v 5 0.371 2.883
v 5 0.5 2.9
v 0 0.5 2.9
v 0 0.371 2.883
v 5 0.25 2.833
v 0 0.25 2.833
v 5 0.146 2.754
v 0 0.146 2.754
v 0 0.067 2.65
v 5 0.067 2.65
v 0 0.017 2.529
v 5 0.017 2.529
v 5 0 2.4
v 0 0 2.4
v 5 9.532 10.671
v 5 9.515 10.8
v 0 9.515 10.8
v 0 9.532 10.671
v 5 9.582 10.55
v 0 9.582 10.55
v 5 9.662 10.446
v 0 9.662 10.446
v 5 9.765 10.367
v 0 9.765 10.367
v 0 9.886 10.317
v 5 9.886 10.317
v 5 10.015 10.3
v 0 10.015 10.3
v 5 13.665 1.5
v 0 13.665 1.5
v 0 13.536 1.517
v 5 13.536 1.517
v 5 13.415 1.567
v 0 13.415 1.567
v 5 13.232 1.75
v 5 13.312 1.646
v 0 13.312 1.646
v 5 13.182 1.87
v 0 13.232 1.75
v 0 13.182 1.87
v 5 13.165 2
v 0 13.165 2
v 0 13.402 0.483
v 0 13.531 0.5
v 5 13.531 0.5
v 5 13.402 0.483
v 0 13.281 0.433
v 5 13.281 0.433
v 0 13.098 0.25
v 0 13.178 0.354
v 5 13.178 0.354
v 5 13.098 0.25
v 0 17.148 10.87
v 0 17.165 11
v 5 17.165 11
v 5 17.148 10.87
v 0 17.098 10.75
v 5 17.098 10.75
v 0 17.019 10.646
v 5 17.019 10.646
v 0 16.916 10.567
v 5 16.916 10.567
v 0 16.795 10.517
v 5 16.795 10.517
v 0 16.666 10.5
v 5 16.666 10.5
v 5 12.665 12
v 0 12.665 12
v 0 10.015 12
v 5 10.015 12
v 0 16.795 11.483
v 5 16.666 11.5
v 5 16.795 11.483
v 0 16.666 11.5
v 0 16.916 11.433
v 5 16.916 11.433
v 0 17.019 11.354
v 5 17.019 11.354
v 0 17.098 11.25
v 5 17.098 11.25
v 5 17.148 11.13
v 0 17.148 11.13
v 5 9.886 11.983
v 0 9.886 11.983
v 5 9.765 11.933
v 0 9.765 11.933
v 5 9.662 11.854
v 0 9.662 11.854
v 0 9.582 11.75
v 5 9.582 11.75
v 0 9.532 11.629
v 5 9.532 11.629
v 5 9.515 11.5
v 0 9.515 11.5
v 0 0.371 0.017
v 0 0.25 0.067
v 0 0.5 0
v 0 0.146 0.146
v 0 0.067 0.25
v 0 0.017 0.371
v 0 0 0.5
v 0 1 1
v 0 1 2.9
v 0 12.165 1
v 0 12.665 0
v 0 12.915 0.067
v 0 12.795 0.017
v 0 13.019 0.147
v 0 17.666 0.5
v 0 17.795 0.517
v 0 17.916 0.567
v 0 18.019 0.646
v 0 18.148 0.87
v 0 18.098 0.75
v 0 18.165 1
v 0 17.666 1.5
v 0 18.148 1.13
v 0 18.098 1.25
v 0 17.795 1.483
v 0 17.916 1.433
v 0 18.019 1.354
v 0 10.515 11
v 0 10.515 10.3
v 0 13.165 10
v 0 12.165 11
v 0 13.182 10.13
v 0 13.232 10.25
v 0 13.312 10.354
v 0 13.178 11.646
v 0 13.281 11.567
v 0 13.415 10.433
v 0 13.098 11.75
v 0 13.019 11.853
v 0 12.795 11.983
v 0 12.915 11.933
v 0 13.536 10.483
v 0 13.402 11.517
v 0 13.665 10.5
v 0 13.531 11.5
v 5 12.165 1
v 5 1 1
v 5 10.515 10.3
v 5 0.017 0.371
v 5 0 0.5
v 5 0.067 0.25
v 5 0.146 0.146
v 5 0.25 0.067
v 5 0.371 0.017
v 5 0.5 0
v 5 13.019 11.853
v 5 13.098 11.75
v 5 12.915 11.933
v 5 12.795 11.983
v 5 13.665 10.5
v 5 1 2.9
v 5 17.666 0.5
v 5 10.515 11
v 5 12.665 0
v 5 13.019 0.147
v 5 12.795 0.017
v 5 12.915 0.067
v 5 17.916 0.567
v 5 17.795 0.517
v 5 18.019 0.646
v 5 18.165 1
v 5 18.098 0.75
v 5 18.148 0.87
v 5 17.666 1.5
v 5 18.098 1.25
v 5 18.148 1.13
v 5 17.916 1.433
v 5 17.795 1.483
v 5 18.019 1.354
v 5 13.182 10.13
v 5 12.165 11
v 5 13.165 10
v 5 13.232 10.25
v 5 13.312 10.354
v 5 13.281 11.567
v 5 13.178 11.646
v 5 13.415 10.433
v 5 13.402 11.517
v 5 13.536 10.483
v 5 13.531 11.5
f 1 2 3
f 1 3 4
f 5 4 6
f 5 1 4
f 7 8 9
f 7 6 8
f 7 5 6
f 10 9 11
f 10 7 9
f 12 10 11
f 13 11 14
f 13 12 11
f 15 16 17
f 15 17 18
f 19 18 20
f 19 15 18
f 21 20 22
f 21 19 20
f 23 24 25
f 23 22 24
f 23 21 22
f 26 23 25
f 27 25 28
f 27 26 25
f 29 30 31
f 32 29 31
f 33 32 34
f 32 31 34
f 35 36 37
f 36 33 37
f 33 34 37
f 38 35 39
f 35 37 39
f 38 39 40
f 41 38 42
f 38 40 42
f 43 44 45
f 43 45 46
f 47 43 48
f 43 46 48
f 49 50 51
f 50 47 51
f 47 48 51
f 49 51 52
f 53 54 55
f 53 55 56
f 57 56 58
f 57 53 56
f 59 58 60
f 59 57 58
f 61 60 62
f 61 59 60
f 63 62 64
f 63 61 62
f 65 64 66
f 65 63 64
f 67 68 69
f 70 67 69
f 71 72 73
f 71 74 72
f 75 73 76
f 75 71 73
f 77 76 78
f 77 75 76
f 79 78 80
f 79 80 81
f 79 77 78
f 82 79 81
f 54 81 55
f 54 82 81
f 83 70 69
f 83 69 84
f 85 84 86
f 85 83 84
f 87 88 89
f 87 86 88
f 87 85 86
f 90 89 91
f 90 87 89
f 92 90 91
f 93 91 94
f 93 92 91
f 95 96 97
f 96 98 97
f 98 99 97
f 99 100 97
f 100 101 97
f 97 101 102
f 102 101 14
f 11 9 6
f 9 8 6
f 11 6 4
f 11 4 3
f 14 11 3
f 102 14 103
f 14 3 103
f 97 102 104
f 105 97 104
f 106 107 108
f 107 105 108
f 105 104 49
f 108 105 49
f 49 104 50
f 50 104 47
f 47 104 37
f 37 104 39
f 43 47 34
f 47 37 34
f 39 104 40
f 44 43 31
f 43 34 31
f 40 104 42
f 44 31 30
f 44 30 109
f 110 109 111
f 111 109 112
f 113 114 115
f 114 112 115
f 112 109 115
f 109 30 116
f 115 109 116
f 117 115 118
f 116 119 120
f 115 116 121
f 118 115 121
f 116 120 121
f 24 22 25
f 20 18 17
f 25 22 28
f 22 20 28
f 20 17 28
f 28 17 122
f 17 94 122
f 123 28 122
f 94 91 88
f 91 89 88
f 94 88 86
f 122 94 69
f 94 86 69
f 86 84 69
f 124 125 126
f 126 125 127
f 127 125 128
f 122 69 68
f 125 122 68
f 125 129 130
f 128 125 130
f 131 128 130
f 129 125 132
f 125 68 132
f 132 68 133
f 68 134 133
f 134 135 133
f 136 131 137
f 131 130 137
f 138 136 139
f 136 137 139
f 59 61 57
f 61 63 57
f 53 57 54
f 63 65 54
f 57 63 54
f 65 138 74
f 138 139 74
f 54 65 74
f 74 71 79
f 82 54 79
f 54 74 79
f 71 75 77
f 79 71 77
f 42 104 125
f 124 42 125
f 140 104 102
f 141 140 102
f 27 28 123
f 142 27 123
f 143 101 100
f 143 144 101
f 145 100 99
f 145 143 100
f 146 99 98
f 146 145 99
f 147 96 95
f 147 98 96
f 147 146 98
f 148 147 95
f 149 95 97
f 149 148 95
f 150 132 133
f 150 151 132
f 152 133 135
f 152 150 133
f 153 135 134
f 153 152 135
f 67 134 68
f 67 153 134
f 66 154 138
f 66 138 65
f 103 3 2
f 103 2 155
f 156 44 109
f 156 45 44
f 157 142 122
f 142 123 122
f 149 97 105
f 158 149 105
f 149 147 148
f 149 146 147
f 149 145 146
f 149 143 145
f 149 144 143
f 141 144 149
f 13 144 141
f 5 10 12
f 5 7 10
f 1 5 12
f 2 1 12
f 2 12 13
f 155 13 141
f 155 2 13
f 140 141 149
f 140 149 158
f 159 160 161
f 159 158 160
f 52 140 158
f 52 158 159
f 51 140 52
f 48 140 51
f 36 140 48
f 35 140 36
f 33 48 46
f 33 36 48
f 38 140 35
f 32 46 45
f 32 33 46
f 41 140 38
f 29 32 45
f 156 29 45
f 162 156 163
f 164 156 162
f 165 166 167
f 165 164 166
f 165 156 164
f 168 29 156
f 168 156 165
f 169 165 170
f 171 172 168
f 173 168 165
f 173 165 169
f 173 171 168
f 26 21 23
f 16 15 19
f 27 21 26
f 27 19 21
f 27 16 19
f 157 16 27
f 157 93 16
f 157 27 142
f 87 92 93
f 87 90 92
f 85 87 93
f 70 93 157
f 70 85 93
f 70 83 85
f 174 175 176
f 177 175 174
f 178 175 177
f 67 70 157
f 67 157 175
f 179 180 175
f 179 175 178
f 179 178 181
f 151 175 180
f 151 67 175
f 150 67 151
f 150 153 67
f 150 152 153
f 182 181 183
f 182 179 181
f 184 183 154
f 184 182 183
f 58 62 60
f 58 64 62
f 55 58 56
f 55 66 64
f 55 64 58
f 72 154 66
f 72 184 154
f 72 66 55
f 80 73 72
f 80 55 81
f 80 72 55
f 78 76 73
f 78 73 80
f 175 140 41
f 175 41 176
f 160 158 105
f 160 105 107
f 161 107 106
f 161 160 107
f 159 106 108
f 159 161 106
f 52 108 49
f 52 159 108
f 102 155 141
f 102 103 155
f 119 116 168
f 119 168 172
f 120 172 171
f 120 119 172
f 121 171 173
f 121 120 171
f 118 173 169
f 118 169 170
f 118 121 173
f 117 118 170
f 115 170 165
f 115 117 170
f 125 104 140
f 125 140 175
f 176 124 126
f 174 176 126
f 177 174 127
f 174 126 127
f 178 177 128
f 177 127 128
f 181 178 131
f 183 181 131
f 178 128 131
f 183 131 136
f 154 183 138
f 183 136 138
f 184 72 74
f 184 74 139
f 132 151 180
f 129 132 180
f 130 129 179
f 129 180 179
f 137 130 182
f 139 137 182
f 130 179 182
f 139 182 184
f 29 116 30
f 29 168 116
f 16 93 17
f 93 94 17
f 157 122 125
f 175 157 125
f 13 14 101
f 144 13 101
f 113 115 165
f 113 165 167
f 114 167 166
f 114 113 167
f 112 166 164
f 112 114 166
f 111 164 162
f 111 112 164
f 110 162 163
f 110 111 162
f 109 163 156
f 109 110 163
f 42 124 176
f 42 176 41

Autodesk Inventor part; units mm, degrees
ref_plane "YZ Plane" through (0, 0, 0) normal (1, 0, 0) x (0, 1, 0)
ref_plane "XZ Plane" through (0, 0, 0) normal (0, 1, 0) x (-1, 0, 0)
ref_plane "XY Plane" through (0, 0, 0) normal (0, 0, 1) x (1, 0, 0)
sketch "Sketch1" plane through (0, 0, 0) normal (1, 0, 0) x (0, 1, 0)
  line L0 (10.279, 12) -> (9.5154, 12)
  line L1 (9.5154, 12) -> (9.5154, 10.3)
  line L2 (9.5154, 10.3) -> (10.5154, 10.3)
  line L3 (10.5154, 10.3) -> (10.5154, 11)
  line L4 (10.5154, 11) -> (12.1654, 11)
  line L5 (13.1654, 12) -> (10.279, 12)
  line L6 (13.1654, 12) -> (13.1654, 1)
  line L7 (12.1654, 1) -> (12.1654, 11)
  line L8 (12.1654, 1) -> (1, 1)
  line L9 (0, 1.2006) -> (0, 0)
  line L10 (0, 0) -> (13.1654, 0)
  line L11 (13.1654, 0) -> (13.1654, 1)
  line L12 (0, 1.2006) -> (0, 2.9)
  line L13 (0, 2.9) -> (1, 2.9)
  line L14 (1, 2.9) -> (1, 1)
  dimension "d0" = 0.7
  dimension "d1" = 1.65
  dimension "d2" = 10
  dimension "d3" = 11.1654
  dimension "d4" = 1
  dimension "d5" = 1
  dimension "d6" = 1
  dimension "d7" = 1
  dimension "d8" = 1
  dimension "d9" = 1.9
extrude "Extrusion1" add sketch "Sketch1" along normal blind 5
fillet "Fillet1" radius 0.5 6 edges at (2.5, 9.5154, 10.3) (2.5, 9.5154, 12) (2.5, 13.1654, 12) (2.5, 13.1654, 0) (2.5, 0, 0) (2.5, 0, 2.9)
sketch "Sketch2" plane through (5, 0, 0) normal (1, 0, 0) x (0, 0, -1)
  line L0 (-0.5, 13.1654) -> (-11.5, 13.1654) projected
  line L1 (-11.5, 13.1654) -> (-10.5, 13.1654)
  line L2 (-10.5, 13.1654) -> (-10.5, 17.1654)
  line L3 (-10.5, 17.1654) -> (-11.5, 17.1654)
  line L4 (-11.5, 17.1654) -> (-11.5, 13.1654)
  line L5 (-0.5, 18.1654) -> (-1.5, 18.1654)
  line L6 (-1.5, 18.1654) -> (-1.5, 13.1654)
  line L7 (-1.5, 13.1654) -> (-0.5, 13.1654)
  line L8 (-0.5, 13.1654) -> (-0.5, 18.1654)
  point P0 (0, 0)
  dimension "d13" = 10
  dimension "d14" = 1
  dimension "d15" = 1
  dimension "d16" = 5
  dimension "d17" = 4
extrude "Extrusion2" add sketch "Sketch2" against normal blind 5
fillet "Fillet2" radius 0.5 8 edges at (2.5, 13.1654, 10.5) (2.5, 13.1654, 11.5) (2.5, 17.1654, 11.5) (2.5, 17.1654, 10.5) (2.5, 13.1654, 1.5) (2.5, 18.1654, 1.5) (2.5, 18.1654, 0.5) (2.5, 13.1654, 0.5)
properties part number "monitor-clip"
